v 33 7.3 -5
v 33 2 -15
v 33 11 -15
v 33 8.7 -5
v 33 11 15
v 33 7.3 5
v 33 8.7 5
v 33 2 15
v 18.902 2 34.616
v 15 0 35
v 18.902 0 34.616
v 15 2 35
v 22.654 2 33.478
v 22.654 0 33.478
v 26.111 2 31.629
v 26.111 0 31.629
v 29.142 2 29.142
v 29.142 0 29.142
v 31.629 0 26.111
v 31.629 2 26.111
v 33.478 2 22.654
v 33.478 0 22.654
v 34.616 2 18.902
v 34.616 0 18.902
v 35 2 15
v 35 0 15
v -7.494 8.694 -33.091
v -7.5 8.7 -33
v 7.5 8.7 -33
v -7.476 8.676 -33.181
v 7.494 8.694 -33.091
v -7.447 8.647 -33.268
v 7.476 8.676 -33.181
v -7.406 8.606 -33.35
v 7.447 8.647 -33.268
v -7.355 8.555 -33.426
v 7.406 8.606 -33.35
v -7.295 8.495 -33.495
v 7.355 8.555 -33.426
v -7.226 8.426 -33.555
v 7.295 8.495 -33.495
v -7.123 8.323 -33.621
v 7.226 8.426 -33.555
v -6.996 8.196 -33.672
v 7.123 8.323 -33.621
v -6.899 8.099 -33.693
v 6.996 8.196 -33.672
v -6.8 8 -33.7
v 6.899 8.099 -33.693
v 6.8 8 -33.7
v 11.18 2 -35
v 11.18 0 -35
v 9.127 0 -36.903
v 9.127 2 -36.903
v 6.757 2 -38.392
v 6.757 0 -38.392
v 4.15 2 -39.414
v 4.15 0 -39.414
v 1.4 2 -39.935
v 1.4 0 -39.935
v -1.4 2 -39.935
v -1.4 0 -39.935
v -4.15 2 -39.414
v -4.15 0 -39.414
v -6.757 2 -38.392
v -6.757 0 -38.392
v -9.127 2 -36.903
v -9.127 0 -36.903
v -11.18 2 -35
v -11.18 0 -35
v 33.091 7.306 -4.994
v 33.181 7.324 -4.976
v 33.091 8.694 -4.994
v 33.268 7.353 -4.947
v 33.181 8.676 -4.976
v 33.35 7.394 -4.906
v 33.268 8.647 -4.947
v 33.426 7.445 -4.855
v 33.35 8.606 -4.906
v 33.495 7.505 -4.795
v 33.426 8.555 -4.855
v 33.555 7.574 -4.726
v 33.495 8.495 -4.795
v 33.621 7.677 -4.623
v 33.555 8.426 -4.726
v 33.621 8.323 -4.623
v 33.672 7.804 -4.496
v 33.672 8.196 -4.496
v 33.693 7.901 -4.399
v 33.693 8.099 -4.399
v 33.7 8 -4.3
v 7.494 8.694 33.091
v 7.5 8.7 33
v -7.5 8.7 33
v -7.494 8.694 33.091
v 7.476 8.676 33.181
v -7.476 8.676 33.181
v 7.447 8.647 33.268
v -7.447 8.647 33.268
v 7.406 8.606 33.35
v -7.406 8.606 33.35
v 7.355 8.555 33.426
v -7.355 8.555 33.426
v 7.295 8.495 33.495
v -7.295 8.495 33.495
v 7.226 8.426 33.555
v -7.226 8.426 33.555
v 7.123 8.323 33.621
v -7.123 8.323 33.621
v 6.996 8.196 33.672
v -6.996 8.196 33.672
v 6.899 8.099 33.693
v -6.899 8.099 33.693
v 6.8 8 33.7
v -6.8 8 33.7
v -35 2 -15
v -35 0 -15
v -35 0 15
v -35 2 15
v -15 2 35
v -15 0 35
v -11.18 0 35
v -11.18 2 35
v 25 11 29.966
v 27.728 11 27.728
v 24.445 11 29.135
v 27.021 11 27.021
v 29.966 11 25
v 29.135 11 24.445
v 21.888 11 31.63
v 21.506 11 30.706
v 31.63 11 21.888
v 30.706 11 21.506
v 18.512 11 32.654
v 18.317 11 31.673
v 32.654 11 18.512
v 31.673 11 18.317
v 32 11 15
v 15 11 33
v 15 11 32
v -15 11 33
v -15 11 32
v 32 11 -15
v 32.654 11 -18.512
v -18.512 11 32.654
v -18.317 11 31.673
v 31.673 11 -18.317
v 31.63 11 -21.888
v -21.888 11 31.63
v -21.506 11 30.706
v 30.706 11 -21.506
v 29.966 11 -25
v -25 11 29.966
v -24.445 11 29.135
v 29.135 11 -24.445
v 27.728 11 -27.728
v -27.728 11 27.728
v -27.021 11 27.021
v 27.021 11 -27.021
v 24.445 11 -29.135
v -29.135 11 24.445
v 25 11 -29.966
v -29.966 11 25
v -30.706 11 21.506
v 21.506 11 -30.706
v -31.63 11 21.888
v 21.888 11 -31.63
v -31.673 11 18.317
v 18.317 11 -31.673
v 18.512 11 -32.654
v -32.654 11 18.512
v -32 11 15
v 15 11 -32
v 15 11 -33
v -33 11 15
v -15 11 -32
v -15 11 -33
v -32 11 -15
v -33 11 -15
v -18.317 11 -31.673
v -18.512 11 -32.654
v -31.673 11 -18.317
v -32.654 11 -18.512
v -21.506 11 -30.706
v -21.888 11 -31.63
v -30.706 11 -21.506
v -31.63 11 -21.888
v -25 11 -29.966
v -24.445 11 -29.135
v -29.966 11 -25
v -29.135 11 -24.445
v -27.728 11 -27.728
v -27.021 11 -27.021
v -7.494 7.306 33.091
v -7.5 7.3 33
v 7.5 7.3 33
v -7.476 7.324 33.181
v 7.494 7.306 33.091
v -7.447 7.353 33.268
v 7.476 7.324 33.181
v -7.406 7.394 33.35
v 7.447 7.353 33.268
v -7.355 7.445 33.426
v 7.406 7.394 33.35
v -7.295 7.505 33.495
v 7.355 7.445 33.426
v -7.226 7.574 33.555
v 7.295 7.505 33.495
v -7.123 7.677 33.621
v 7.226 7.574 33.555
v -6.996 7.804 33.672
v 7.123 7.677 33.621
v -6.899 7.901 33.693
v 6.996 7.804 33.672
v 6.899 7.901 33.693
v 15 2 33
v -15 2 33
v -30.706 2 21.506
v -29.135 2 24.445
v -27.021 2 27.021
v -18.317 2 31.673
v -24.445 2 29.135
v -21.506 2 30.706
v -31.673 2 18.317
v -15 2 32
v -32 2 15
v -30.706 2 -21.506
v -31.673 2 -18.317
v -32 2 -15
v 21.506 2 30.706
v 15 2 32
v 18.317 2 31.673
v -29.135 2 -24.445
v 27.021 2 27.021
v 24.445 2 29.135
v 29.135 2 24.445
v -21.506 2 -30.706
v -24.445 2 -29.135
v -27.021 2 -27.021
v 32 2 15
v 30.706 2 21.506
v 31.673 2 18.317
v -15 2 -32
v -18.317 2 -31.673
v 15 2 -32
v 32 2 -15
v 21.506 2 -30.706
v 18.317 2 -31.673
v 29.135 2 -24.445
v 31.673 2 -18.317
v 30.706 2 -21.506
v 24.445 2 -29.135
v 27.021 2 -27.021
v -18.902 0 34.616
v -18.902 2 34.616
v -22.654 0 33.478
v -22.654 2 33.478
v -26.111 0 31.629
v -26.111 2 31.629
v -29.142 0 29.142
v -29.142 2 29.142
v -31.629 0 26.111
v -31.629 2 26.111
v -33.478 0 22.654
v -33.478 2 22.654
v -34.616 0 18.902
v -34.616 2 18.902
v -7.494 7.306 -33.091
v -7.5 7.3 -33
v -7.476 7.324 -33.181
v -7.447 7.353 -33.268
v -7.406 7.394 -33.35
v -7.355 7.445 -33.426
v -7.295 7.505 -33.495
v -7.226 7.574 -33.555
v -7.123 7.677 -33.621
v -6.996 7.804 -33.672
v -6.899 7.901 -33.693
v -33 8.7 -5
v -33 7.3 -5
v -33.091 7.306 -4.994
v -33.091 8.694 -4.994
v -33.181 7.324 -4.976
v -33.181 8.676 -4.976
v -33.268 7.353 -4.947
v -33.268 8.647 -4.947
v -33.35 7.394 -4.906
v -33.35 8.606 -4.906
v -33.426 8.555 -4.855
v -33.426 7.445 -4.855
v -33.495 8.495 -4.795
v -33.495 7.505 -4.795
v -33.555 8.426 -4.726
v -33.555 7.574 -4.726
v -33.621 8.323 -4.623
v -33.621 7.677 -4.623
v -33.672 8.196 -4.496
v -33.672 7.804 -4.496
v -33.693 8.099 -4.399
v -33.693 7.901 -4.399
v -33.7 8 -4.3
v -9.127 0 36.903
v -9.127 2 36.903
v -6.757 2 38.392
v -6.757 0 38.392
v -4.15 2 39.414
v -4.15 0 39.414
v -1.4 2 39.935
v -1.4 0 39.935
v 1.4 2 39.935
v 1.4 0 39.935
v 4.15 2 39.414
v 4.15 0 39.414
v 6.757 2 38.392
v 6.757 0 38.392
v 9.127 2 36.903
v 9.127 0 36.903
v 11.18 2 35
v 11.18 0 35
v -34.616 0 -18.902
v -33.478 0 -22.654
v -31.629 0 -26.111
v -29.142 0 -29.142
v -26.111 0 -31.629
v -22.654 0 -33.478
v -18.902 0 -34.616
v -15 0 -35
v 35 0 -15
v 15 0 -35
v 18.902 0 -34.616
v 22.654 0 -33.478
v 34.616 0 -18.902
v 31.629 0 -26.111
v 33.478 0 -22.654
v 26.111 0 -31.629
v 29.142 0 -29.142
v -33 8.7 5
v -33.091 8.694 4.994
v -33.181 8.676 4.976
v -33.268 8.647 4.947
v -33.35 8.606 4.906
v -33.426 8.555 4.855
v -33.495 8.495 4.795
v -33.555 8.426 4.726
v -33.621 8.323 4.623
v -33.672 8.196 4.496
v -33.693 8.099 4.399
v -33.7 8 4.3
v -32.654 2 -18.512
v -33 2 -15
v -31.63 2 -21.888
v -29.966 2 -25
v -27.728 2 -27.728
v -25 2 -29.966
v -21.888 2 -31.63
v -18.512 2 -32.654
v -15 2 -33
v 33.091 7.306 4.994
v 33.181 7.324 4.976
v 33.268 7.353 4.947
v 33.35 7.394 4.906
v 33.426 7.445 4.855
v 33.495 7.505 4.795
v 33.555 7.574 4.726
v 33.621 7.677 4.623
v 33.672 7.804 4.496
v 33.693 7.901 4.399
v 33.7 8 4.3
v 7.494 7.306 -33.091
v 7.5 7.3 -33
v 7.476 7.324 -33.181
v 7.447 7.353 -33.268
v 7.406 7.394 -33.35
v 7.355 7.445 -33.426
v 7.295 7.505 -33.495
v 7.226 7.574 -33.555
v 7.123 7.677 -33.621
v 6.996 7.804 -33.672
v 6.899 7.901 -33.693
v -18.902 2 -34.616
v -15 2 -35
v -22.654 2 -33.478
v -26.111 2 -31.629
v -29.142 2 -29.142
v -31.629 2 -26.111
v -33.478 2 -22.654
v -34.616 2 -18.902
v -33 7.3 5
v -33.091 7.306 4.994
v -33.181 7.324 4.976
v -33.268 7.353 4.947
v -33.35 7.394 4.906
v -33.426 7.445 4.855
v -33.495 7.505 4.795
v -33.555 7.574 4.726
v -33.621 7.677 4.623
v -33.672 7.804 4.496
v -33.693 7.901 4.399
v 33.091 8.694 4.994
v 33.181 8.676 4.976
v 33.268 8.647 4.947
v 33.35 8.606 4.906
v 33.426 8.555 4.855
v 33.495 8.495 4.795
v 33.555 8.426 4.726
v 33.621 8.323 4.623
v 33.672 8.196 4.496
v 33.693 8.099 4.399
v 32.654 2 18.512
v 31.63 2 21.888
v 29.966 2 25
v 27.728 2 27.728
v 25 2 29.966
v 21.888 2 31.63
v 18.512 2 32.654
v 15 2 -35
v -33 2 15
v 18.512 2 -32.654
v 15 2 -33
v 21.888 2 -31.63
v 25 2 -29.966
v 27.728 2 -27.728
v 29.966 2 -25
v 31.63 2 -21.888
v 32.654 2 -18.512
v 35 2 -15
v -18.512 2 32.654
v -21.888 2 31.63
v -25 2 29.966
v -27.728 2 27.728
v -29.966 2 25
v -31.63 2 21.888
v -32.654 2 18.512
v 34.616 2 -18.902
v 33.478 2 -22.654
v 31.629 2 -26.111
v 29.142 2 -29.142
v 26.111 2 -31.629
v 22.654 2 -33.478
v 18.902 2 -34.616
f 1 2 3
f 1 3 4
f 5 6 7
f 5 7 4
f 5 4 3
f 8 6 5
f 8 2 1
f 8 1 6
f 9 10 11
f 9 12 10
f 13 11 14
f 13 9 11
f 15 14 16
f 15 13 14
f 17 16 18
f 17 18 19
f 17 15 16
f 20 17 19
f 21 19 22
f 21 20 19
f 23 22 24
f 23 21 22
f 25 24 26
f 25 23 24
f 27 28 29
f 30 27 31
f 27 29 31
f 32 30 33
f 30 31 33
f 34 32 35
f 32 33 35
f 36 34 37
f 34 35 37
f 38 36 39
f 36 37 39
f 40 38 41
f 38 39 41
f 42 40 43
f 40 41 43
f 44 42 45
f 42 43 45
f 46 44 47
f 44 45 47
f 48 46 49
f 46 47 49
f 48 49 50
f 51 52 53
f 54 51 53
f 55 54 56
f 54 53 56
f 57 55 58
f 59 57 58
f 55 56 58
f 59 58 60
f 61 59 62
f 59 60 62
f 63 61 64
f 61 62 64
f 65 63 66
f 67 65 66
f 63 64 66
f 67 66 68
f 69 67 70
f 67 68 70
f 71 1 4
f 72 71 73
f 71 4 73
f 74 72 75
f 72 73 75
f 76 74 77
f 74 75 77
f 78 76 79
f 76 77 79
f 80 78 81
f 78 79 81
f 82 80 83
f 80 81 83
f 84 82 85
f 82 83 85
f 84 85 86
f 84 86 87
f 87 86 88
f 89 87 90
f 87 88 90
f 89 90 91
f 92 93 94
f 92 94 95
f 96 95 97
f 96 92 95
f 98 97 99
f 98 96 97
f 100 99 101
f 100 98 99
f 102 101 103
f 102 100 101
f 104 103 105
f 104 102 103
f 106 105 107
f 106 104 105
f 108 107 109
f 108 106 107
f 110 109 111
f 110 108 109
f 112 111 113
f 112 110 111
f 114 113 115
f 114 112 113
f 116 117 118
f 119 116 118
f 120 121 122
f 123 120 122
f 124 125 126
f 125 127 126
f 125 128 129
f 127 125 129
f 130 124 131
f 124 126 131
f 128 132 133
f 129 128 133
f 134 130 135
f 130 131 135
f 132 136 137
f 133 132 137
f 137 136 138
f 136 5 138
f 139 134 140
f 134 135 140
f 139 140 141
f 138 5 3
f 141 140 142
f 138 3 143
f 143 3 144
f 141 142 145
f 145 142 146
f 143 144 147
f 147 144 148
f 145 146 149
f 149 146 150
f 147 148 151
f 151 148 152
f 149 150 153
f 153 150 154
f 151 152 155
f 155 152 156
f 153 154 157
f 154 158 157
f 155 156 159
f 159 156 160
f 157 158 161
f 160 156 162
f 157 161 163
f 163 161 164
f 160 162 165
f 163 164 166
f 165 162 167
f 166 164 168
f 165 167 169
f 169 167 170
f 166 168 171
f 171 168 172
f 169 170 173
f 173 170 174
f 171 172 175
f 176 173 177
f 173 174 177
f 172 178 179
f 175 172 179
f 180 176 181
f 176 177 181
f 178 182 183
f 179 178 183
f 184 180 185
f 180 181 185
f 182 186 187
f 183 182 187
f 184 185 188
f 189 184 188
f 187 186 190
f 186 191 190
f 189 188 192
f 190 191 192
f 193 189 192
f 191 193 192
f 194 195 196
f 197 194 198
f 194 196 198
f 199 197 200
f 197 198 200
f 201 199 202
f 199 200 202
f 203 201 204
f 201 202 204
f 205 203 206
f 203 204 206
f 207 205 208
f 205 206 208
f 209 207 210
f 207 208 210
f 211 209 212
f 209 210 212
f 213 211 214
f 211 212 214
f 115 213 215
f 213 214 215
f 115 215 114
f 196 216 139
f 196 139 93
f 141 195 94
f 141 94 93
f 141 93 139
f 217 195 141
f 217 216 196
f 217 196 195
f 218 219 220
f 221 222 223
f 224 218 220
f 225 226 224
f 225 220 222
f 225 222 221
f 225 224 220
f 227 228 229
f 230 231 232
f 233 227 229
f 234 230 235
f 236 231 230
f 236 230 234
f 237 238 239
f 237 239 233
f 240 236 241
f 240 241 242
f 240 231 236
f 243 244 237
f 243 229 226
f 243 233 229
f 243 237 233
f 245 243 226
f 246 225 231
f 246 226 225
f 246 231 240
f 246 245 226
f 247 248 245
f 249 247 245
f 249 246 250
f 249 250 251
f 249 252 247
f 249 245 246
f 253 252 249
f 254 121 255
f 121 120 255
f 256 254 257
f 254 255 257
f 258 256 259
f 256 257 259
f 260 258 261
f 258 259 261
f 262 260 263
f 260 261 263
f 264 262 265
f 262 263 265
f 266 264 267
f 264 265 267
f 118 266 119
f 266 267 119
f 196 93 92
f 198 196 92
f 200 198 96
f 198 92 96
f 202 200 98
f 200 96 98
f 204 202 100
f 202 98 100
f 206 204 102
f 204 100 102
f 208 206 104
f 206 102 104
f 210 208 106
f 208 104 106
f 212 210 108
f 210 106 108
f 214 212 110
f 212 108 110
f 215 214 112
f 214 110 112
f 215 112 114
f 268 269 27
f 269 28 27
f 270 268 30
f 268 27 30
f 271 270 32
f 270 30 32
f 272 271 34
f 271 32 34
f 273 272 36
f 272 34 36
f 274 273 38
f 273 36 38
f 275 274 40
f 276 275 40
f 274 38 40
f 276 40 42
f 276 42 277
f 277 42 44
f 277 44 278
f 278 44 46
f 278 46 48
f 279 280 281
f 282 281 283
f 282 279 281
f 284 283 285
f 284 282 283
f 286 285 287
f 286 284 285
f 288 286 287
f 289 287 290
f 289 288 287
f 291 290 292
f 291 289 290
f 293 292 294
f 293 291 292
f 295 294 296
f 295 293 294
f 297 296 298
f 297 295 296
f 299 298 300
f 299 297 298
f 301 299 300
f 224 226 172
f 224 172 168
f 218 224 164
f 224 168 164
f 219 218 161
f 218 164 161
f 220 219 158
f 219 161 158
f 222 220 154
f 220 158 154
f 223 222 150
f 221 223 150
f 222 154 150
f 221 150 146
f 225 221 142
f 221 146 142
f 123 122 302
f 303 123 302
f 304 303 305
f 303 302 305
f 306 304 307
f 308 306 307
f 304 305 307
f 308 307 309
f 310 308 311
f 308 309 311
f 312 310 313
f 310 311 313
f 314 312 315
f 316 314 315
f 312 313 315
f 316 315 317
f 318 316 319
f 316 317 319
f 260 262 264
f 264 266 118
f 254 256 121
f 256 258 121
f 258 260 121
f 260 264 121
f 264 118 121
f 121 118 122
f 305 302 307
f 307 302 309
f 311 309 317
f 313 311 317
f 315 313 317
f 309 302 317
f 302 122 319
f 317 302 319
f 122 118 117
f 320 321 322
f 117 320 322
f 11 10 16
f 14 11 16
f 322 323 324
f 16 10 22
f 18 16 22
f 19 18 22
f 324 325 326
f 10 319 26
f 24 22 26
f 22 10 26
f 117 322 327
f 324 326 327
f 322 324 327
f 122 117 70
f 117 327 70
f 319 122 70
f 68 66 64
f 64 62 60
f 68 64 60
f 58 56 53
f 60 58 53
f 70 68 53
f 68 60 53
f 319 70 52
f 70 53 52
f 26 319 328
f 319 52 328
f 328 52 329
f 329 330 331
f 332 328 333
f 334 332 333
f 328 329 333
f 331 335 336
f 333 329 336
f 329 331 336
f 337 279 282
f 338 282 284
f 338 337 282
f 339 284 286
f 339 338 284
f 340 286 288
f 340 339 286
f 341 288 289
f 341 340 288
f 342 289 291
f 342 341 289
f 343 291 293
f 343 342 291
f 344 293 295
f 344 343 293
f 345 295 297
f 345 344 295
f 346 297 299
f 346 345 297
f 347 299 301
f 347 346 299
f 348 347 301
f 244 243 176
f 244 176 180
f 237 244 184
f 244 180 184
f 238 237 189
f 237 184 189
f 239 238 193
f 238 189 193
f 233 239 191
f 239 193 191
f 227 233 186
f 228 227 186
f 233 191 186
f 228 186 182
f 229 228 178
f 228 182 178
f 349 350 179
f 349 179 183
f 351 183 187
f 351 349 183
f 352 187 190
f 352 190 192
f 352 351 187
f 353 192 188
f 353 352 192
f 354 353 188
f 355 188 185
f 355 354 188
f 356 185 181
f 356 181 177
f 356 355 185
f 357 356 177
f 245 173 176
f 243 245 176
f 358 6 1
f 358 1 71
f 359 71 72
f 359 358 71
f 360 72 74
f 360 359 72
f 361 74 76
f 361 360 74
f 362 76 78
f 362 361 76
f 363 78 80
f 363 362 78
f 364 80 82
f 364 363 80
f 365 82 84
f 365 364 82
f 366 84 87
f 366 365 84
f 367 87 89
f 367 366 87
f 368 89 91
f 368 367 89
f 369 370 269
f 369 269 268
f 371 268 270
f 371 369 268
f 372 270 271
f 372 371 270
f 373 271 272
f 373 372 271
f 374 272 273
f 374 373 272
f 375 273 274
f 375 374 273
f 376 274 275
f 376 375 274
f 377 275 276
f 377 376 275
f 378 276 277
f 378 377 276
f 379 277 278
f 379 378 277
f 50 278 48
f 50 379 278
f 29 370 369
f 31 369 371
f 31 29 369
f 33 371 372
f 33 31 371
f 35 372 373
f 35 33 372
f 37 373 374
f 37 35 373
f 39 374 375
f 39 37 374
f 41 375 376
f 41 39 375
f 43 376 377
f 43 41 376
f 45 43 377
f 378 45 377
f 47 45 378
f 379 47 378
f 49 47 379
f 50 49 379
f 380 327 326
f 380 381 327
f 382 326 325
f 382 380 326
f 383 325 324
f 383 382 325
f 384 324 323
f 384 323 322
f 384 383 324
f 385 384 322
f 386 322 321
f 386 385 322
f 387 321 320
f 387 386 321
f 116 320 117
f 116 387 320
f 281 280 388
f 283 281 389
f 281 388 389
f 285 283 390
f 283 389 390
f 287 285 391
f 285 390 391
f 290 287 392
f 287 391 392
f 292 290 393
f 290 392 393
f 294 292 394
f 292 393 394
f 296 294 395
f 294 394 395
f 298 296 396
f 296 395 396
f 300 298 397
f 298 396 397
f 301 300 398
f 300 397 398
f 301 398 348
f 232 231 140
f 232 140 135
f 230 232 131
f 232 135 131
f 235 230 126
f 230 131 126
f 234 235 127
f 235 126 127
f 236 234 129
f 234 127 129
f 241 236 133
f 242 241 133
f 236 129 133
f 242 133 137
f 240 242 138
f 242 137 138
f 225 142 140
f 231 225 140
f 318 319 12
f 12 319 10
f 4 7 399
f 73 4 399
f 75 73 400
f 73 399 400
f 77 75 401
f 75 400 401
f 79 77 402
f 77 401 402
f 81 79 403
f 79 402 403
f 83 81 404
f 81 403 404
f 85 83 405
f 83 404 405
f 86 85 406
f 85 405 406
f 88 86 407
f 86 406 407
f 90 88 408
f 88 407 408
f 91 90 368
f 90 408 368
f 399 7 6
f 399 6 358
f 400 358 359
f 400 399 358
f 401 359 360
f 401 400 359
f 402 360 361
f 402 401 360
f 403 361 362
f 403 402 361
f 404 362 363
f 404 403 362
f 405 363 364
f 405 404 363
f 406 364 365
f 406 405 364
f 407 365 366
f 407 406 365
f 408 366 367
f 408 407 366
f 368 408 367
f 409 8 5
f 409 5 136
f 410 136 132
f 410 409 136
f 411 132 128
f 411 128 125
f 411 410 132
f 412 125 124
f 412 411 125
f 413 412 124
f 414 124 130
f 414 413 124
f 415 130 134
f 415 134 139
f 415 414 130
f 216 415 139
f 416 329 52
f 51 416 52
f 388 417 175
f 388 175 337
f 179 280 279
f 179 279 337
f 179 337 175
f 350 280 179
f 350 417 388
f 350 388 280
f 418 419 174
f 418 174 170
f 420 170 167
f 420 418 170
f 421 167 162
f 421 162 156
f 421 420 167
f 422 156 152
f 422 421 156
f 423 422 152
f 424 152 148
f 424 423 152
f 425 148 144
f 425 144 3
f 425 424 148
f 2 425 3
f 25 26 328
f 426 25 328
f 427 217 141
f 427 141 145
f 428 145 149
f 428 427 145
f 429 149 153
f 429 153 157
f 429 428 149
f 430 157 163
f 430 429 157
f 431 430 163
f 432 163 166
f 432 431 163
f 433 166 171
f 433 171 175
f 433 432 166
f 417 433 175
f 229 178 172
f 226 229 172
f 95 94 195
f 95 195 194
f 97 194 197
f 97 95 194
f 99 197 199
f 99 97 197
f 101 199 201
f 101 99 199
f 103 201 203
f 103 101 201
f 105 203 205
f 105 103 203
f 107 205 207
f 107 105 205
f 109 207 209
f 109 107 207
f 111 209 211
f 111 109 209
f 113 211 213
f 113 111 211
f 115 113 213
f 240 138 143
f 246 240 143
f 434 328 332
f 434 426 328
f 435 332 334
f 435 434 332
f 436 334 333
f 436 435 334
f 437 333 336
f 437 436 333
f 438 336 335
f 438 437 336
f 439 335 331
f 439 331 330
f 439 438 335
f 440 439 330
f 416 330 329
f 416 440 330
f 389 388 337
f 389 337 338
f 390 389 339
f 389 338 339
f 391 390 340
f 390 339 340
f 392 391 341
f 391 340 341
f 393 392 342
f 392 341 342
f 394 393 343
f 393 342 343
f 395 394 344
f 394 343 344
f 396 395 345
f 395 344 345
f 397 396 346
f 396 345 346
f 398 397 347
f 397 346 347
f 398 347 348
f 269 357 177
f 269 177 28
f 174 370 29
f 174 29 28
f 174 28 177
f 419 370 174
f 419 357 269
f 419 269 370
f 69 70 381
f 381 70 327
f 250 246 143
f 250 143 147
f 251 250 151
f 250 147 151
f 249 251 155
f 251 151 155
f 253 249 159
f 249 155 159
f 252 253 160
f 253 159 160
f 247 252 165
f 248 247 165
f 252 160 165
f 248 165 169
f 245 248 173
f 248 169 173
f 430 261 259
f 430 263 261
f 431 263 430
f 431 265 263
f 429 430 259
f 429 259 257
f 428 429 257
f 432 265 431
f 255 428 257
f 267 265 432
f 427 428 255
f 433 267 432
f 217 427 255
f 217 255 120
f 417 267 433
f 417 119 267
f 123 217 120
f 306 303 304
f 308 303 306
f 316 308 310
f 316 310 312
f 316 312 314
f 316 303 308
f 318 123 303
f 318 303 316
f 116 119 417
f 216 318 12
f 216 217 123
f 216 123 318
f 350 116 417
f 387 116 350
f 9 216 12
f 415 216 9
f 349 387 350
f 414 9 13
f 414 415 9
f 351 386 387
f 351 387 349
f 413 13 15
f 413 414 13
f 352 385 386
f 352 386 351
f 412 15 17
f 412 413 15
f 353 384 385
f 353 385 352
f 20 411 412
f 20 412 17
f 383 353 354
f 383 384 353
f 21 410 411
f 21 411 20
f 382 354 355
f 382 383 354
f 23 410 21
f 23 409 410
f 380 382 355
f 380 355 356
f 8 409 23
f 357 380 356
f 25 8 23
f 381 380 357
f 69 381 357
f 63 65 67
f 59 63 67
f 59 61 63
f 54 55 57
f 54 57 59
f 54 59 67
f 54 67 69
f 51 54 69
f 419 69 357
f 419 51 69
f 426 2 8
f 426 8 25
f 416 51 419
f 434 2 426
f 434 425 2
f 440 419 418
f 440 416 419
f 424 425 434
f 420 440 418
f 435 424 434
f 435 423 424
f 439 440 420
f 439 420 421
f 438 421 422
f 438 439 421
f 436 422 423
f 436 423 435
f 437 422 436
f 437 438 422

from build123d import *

# Parameters (mm, degrees)
EXTRUDE_1_DEPTH        = 2
FILLET_1_R             = 20
EXTRUDE_2_DEPTH        = 9
CUT_EXTRUDE_2_DEPTH    = 9
SKETCH_4_W             = 10
SKETCH_4_H             = 1.4
EXTRUDE_3_DEPTH        = 0.7
FILLET_2_R             = 0.7
FILLET_2_OF_MIRROR_1_R = 0.7
SKETCH_5_W             = 15
SKETCH_5_H             = 1.4
EXTRUDE_4_DEPTH        = 0.7
FILLET_3_R             = 0.7
FILLET_3_OF_MIRROR_2_R = 0.7


with BuildPart() as part:
    # 草图1 → 凸台-拉伸1 (new body)
    with BuildSketch(Plane(origin=(0, 0, 0), x_dir=(1, 0, 0), z_dir=(0, 1, 0))):
        with BuildLine():
            Line((-35, -35), (-11.180339887, -35))
            ThreePointArc((-11.180339887, -35), (0, -40), (11.180339887, -35))
            Line((11.180339887, -35), (35, -35))
            Line((35, -35), (35, 35))
            Line((35, 35), (11.180339887, 35))
            ThreePointArc((11.180339887, 35), (0, 40), (-11.180339887, 35))
            Line((-11.180339887, 35), (-35, 35))
            Line((-35, 35), (-35, -35))
        make_face()
    extrude(amount=EXTRUDE_1_DEPTH)

    # 圆角1
    fillet_1_edges = [part.edges().sort_by_distance(p)[0] for p in [
        (35, 1, -35),
        (35, 1, 35),
        (-35, 1, 35),
        (-35, 1, -35),
    ]]
    fillet(fillet_1_edges, radius=FILLET_1_R)

    # 草图2 → 凸台-拉伸2 (add)
    with BuildSketch(Plane(origin=(0, 2, 0), x_dir=(1, 0, 0), z_dir=(0, 1, 0))):
        with BuildLine():
            Line((-10.246950766, 33), (10.246950766, 33))
            Line((10.246950766, 33), (15, 33))
            ThreePointArc((15, 33), (27.727922061, 27.727922061), (33, 15))
            Line((33, 15), (33, -15))
            ThreePointArc((33, -15), (27.727922061, -27.727922061), (15, -33))
            Line((15, -33), (10.246950766, -33))
            Line((10.246950766, -33), (-10.246950766, -33))
            Line((-10.246950766, -33), (-15, -33))
            ThreePointArc((-15, -33), (-27.727922061, -27.727922061), (-33, -15))
            Line((-33, -15), (-33, 15))
            ThreePointArc((-33, 15), (-27.727922061, 27.727922061), (-15, 33))
            Line((-15, 33), (-10.246950766, 33))
        make_face()
    extrude(amount=EXTRUDE_2_DEPTH)

    # 草图3 → 切除-拉伸2 (cut)
    with BuildSketch(Plane(origin=(0, 11, 0), x_dir=(1, 0, 0), z_dir=(0, 1, 0))):
        with BuildLine():
            Line((-15, -32), (15, -32))
            ThreePointArc((15, -32), (27.02081528, -27.02081528), (32, -15))
            Line((32, -15), (32, 15))
            ThreePointArc((32, 15), (27.02081528, 27.02081528), (15, 32))
            Line((15, 32), (-15, 32))
            ThreePointArc((-15, 32), (-27.02081528, 27.02081528), (-32, 15))
            Line((-32, 15), (-32, -15))
            ThreePointArc((-32, -15), (-27.02081528, -27.02081528), (-15, -32))
        make_face()
    extrude(amount=-CUT_EXTRUDE_2_DEPTH, mode=Mode.SUBTRACT)

    # 草图4 → 凸台-拉伸3 (add)
    with BuildSketch(Plane.ZY.offset(33)):
        with Locations((0, 8)):
            Rectangle(SKETCH_4_W, SKETCH_4_H)
    extrude_3 = extrude(amount=EXTRUDE_3_DEPTH)

    # 圆角2
    fillet_2_edges = [part.edges().sort_by_distance(p)[0] for p in [
        (-33.7, 8, 5),
        (-33.7, 8, -5),
        (-33.7, 7.3, 0),
        (-33.7, 8.7, 0),
    ]]
    fillet(fillet_2_edges, radius=FILLET_2_R - 0.0001)  # a hair under: the kernel refuses the full size

    # 镜向1: 凸台-拉伸3 across plane
    add(extrude_3.mirror(Plane(origin=(0, 0, 0), x_dir=(0, 0, 1), z_dir=(1, 0, 0))))

    # 圆角2 of 镜向1
    fillet_2_of_mirror_1_edges = [part.edges().sort_by_distance(p)[0] for p in [
        (33.7, 8, 5),
        (33.7, 8, -5),
        (33.7, 7.3, 0),
        (33.7, 8.7, 0),
    ]]
    fillet(fillet_2_of_mirror_1_edges, radius=FILLET_2_OF_MIRROR_1_R - 0.0001)  # a hair under: the kernel refuses the full size

    # 草图5 → 凸台-拉伸4 (add)
    with BuildSketch(Plane.XY.offset(33)):
        with Locations((0, 8)):
            Rectangle(SKETCH_5_W, SKETCH_5_H)
    extrude_4 = extrude(amount=EXTRUDE_4_DEPTH)

    # 圆角3
    fillet_3_edges = [part.edges().sort_by_distance(p)[0] for p in [
        (0, 7.3, 33.7),
        (-7.5, 8, 33.7),
        (0, 8.7, 33.7),
        (7.5, 8, 33.7),
    ]]
    fillet(fillet_3_edges, radius=FILLET_3_R - 0.0001)  # a hair under: the kernel refuses the full size

    # 镜向2: 凸台-拉伸4 across plane
    add(extrude_4.mirror(Plane.XY))

    # 圆角3 of 镜向2
    fillet_3_of_mirror_2_edges = [part.edges().sort_by_distance(p)[0] for p in [
        (0, 7.3, -33.7),
        (-7.5, 8, -33.7),
        (0, 8.7, -33.7),
        (7.5, 8, -33.7),
    ]]
    fillet(fillet_3_of_mirror_2_edges, radius=FILLET_3_OF_MIRROR_2_R - 0.0001)  # a hair under: the kernel refuses the full size


solid = part.part
